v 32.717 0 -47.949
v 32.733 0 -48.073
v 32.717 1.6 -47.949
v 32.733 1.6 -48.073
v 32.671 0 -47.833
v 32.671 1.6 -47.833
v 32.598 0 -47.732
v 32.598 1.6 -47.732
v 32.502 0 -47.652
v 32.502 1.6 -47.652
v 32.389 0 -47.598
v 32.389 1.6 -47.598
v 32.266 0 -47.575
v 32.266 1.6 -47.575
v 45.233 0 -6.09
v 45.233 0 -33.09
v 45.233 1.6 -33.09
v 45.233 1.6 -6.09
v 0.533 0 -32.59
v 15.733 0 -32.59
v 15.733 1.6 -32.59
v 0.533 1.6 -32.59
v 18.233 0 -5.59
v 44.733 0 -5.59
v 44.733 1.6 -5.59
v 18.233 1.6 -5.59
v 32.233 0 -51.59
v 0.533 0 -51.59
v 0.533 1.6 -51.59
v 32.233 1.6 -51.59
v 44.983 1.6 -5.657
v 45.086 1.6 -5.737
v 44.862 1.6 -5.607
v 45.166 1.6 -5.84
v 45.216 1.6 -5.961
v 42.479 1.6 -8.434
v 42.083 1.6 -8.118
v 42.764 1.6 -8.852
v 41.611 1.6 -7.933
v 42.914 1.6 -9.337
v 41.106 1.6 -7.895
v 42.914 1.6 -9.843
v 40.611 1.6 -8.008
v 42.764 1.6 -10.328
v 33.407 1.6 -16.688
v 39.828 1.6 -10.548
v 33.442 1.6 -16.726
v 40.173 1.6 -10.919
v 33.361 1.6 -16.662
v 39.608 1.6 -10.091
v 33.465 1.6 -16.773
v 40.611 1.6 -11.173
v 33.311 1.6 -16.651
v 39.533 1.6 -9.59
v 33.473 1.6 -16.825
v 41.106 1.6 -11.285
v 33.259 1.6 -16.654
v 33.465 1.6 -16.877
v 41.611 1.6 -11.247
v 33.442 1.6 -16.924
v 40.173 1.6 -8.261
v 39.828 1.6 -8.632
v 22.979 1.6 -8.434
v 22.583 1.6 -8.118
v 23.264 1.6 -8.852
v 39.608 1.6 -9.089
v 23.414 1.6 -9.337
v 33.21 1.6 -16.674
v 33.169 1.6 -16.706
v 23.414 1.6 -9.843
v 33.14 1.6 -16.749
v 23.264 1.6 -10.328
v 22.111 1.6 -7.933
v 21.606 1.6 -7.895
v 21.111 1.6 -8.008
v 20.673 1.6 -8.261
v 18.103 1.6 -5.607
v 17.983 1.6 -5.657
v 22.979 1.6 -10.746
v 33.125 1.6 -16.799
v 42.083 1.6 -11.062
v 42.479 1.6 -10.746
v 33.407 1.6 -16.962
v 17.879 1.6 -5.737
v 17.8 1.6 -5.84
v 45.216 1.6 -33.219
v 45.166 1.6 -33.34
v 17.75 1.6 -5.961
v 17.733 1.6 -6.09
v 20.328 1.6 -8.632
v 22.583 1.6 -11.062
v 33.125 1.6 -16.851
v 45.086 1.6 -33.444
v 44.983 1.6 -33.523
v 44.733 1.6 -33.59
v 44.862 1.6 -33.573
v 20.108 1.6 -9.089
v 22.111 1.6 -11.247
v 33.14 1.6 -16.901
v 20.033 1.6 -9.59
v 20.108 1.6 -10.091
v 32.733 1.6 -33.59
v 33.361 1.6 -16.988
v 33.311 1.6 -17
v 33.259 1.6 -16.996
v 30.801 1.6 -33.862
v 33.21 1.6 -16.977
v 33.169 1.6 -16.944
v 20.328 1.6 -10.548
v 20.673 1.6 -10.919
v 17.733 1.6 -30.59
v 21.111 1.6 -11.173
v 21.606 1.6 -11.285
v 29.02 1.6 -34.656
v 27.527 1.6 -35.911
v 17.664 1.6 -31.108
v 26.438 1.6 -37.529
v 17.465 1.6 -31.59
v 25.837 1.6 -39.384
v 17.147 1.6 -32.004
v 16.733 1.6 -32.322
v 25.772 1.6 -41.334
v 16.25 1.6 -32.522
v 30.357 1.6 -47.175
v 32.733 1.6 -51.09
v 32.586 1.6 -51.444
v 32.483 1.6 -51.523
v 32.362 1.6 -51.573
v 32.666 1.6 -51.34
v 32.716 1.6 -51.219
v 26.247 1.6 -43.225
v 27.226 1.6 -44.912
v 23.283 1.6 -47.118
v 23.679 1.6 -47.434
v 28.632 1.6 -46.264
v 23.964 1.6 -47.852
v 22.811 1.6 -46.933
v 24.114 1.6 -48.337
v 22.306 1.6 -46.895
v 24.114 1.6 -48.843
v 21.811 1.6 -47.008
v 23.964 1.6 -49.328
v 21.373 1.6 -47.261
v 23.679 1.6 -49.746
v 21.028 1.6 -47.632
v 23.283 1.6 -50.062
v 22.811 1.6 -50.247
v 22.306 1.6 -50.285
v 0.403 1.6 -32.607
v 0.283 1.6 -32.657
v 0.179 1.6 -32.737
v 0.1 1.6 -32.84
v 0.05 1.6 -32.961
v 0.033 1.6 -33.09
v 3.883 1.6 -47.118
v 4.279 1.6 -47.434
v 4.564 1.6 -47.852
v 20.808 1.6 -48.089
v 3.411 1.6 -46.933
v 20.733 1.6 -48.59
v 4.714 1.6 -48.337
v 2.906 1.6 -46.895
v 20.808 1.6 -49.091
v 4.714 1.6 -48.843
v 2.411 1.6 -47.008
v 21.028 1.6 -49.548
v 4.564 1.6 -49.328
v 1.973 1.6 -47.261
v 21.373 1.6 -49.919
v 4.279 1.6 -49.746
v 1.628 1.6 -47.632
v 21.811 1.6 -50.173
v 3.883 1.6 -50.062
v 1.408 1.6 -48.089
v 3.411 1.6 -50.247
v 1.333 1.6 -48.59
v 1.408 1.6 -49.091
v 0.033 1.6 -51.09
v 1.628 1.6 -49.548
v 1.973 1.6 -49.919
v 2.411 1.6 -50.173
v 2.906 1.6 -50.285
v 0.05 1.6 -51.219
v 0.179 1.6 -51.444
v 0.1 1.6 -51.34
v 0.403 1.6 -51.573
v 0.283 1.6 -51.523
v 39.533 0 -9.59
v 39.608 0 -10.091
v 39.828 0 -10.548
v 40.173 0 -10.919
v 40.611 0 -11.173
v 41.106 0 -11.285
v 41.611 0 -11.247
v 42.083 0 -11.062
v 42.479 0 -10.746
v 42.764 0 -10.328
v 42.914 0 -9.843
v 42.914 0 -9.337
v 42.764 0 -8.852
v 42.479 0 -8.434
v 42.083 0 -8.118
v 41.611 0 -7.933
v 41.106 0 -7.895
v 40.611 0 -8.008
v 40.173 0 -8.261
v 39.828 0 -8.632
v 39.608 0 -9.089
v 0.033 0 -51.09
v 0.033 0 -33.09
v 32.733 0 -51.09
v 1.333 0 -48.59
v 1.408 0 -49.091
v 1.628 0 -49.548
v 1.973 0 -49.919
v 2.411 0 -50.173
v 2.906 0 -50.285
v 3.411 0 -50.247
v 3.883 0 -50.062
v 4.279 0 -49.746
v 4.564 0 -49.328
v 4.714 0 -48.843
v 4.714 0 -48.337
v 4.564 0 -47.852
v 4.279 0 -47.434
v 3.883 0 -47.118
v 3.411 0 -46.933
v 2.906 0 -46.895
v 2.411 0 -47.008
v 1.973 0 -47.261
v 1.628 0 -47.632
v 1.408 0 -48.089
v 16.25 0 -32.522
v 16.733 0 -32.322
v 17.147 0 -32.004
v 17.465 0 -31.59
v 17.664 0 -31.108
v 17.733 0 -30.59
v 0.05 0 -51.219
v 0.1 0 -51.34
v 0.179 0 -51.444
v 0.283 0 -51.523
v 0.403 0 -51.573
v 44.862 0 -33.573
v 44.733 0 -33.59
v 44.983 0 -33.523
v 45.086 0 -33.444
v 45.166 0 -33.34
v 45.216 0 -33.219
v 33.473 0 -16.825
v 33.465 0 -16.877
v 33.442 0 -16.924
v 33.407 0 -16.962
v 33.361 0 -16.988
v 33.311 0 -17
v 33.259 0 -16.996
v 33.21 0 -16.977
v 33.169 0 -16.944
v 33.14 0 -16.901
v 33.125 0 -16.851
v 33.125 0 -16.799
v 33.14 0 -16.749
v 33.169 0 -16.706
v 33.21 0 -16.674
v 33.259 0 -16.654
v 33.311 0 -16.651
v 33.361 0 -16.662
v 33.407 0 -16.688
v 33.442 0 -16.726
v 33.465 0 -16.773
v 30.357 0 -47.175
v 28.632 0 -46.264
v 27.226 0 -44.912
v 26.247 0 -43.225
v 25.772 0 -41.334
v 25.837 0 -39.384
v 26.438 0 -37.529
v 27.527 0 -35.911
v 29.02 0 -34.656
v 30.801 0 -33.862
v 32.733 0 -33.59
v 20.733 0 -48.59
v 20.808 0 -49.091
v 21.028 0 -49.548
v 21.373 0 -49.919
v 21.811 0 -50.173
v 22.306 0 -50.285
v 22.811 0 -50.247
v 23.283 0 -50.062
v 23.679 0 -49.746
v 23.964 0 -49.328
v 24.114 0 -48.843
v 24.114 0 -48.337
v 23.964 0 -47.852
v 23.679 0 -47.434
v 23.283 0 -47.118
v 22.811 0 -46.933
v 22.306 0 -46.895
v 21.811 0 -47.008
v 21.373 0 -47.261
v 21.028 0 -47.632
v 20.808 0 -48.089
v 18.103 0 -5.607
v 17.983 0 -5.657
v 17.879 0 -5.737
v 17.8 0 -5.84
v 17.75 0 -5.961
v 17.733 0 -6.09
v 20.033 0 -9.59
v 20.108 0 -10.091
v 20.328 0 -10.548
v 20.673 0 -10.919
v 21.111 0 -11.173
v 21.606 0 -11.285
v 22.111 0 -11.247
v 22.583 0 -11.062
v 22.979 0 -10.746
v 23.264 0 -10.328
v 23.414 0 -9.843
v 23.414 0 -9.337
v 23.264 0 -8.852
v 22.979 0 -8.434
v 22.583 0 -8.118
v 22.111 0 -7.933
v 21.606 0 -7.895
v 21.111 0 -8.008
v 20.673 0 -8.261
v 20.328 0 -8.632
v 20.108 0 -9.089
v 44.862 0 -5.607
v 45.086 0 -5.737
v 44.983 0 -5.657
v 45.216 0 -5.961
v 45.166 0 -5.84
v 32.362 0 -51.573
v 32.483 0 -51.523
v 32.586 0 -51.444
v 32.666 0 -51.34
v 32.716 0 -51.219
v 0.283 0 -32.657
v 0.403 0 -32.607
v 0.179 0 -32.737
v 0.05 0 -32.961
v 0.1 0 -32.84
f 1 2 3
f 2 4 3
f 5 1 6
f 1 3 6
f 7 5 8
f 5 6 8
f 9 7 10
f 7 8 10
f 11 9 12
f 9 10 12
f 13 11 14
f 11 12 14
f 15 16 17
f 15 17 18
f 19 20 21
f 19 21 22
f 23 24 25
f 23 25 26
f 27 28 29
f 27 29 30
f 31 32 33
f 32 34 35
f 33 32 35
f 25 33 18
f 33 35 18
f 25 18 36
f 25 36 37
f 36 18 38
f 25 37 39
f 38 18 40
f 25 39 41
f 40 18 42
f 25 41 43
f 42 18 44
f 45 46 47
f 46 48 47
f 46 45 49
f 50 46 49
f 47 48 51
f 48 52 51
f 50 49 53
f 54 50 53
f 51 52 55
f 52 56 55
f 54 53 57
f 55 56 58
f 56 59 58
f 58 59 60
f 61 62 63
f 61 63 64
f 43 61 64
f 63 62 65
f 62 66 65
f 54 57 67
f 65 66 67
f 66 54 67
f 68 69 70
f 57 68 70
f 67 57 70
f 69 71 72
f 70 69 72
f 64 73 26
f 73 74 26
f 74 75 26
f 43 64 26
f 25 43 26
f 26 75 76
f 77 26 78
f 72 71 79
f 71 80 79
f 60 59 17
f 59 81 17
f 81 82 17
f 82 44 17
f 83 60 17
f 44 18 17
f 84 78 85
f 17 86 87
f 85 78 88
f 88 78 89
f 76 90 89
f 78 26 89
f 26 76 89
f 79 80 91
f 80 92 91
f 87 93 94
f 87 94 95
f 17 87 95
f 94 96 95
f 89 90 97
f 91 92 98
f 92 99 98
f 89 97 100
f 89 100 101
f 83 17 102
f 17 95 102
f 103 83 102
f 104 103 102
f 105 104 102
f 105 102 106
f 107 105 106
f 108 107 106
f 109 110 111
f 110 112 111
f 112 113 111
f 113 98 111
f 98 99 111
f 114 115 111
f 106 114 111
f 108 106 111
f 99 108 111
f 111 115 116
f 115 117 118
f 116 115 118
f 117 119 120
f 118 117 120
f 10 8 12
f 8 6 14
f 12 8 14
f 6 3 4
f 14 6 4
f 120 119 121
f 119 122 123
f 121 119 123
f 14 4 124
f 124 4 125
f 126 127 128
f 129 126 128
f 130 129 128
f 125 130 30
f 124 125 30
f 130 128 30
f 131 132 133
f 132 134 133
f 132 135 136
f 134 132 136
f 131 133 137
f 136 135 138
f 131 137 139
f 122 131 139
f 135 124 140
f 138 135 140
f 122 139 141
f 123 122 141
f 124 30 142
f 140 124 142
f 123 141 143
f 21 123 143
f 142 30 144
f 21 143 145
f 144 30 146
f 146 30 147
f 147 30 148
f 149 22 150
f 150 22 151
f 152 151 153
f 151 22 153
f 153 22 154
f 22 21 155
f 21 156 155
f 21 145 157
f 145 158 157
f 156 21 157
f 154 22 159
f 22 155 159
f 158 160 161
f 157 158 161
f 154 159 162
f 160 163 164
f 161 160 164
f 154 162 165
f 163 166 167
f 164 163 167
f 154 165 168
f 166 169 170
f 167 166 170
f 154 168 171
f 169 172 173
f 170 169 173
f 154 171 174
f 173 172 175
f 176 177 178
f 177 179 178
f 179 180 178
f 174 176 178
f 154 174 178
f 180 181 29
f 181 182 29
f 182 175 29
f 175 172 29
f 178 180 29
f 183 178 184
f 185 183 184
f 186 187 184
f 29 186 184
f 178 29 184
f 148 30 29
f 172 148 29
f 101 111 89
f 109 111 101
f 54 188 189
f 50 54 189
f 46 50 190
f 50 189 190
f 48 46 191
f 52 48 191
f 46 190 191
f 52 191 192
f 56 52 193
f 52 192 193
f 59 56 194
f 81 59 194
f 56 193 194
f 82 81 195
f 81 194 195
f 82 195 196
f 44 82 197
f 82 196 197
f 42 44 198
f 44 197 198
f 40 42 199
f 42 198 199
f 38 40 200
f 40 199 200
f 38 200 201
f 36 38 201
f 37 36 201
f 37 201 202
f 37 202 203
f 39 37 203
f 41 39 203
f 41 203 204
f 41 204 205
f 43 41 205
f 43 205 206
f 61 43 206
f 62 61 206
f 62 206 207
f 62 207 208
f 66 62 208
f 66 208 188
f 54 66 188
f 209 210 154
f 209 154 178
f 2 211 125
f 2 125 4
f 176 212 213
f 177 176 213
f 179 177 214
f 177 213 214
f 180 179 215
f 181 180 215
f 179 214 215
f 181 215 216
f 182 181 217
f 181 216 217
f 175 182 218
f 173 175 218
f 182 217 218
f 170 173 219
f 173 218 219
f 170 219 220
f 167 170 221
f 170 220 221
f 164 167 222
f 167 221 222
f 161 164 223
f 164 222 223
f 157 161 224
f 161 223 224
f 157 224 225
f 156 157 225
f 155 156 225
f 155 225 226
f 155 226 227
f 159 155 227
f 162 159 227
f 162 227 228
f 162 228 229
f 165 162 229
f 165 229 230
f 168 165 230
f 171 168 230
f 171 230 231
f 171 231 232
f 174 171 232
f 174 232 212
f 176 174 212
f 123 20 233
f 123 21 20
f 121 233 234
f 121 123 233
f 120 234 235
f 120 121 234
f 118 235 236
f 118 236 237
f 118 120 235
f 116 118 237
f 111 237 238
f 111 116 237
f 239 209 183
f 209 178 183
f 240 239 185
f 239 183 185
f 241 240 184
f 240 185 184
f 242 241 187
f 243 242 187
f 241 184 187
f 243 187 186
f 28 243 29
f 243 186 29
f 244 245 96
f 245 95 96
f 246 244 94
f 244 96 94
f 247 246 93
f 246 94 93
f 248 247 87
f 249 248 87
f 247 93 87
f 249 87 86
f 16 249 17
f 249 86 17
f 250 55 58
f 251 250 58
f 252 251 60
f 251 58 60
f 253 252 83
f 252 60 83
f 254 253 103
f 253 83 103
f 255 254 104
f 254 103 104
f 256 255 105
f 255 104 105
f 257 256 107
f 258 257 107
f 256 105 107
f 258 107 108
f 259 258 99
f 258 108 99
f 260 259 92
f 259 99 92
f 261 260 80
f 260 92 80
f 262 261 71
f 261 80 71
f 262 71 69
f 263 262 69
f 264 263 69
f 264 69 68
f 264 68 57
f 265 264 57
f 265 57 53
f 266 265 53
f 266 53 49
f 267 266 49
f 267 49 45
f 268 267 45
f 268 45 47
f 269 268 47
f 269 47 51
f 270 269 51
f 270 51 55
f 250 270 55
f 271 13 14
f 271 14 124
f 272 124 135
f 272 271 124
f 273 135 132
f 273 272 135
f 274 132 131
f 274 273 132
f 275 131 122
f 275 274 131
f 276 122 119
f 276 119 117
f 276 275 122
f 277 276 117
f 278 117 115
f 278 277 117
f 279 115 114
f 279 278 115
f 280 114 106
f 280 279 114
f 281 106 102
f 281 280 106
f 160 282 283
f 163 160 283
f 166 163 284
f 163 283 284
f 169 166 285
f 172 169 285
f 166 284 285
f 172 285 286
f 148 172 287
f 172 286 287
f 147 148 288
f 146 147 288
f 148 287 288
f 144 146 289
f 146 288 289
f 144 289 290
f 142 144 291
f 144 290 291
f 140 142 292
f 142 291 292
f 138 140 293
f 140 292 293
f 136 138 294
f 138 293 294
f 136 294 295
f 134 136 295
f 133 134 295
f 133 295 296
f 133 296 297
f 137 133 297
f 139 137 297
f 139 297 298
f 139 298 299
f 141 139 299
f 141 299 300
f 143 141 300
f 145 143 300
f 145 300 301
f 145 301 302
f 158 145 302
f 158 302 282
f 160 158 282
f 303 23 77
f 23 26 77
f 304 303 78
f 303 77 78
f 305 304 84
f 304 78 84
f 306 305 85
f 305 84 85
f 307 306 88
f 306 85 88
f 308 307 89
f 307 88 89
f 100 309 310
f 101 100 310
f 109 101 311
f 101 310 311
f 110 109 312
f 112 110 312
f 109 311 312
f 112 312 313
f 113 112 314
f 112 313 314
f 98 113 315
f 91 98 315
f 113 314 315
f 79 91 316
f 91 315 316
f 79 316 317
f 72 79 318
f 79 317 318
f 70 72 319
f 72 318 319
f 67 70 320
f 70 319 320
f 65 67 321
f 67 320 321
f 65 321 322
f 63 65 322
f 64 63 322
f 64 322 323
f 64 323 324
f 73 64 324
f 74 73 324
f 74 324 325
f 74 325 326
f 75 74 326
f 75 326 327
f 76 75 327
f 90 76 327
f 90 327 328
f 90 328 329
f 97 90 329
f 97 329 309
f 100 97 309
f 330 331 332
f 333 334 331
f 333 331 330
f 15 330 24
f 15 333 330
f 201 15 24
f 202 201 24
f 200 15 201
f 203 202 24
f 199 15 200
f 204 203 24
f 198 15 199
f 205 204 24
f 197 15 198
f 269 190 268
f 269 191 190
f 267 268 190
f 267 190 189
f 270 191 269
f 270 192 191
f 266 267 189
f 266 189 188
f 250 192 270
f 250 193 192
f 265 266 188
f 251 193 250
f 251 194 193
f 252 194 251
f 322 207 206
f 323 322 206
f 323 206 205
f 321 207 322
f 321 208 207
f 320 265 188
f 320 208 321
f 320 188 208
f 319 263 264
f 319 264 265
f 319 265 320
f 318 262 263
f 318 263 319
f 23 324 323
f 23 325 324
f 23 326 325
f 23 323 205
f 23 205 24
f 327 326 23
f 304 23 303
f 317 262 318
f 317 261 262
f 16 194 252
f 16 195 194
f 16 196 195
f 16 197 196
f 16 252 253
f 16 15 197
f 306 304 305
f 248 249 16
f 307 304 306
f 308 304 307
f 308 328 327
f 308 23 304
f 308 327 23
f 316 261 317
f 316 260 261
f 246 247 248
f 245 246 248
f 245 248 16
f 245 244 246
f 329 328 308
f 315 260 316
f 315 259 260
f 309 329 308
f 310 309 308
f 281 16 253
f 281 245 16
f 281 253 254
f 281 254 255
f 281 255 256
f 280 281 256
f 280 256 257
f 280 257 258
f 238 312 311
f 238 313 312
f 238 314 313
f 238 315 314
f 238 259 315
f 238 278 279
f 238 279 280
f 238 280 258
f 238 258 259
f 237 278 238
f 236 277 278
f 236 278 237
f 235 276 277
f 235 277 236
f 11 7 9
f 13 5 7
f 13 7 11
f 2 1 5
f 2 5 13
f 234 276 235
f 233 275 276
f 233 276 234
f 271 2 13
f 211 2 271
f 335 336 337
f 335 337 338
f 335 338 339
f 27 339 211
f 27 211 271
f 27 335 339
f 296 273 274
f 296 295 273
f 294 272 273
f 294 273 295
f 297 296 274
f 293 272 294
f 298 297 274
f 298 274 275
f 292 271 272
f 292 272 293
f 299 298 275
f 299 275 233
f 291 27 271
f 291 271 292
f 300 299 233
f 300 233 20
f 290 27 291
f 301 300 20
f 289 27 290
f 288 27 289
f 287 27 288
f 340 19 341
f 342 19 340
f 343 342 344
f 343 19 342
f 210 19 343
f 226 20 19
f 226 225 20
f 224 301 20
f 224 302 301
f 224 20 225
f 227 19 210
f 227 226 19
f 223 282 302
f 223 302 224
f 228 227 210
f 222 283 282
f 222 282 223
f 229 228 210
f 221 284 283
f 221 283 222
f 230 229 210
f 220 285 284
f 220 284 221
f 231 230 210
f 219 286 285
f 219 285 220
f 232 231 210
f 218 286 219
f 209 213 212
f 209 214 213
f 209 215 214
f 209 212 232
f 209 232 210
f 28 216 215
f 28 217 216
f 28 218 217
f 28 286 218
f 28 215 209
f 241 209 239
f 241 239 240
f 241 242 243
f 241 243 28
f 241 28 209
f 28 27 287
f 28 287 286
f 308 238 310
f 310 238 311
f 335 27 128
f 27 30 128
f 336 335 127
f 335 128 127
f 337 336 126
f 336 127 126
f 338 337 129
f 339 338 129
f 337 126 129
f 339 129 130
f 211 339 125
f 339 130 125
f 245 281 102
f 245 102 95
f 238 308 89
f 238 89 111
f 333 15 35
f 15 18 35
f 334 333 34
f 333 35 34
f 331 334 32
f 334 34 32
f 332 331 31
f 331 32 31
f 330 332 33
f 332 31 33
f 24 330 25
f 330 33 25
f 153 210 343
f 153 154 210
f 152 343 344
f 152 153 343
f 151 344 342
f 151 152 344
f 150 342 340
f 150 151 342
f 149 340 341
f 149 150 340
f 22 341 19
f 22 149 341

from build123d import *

# Parameters (mm, degrees)
BOSS_EXTRUDE1_DEPTH  = 1.6
FILLET1_R            = 0.5
FILLET2_R            = 2
M3_CLEARANCE_HOLE1_D = 3.4
SKETCH4_R            = 0.175
CUT_EXTRUDE1_DEPTH   = 2.6


with BuildPart() as part:
    # Sketch1 → Boss-Extrude1 (new body)
    with BuildSketch(Plane(origin=(0, 0, 0), x_dir=(1, 0, 0), z_dir=(0, 1, 0))):
        with BuildLine():
            Line((0.032553291, 32.590082792), (0.032553291, 51.590082792))
            Line((0.032553291, 51.590082792), (32.732553291, 51.590082792))
            Line((32.732553291, 51.590082792), (32.732553291, 47.590082792))
            ThreePointArc((32.732553291, 47.590082792), (25.732553291, 40.590082792), (32.732553291, 33.590082792))
            Line((32.732553291, 33.590082792), (45.232553291, 33.590082792))
            Line((45.232553291, 33.590082792), (45.232553291, 5.590082792))
            Line((45.232553291, 5.590082792), (17.732553291, 5.590082792))
            Line((17.732553291, 5.590082792), (17.732553291, 32.590082792))
            Line((17.732553291, 32.590082792), (0.032553291, 32.590082792))
        make_face()
    extrude(amount=BOSS_EXTRUDE1_DEPTH)

    # Fillet1
    fillet1_edges = [part.edges().sort_by_distance(p)[0] for p in [
        (32.732553291, 0.8, -51.590082792),
        (32.732553291, 0.8, -47.590082792),
        (45.232553291, 0.8, -33.590082792),
        (45.232553291, 0.8, -5.590082792),
        (17.732553291, 0.8, -5.590082792),
        (0.032553291, 0.8, -32.590082792),
        (0.032553291, 0.8, -51.590082792),
    ]]
    fillet(fillet1_edges, radius=FILLET1_R)

    # Fillet2
    fillet2_edges = [part.edges().sort_by_distance(p)[0] for p in [
        (17.732553291, 0.8, -32.590082792),
    ]]
    fillet(fillet2_edges, radius=FILLET2_R)

    # M3 Clearance Hole1 (through all)
    with Locations(Plane(origin=(0, 1.6, 0), x_dir=(1, 0, 0), z_dir=(0, 1, 0))):
        with Locations((3.032553291, 48.590082792), (22.432553291, 48.590082792), (21.732553291, 9.590082792), (41.232553291, 9.590082792)):
            Hole(M3_CLEARANCE_HOLE1_D / 2)

    # Sketch4 → Cut-Extrude1 (cut, through all)
    with BuildSketch(Plane(origin=(0, 1.6, 0), x_dir=(1, 0, 0), z_dir=(0, 1, 0))):
        with Locations((33.297557825, 16.825078258)):
            Circle(SKETCH4_R)
    extrude(amount=-CUT_EXTRUDE1_DEPTH, mode=Mode.SUBTRACT)


solid = part.part
